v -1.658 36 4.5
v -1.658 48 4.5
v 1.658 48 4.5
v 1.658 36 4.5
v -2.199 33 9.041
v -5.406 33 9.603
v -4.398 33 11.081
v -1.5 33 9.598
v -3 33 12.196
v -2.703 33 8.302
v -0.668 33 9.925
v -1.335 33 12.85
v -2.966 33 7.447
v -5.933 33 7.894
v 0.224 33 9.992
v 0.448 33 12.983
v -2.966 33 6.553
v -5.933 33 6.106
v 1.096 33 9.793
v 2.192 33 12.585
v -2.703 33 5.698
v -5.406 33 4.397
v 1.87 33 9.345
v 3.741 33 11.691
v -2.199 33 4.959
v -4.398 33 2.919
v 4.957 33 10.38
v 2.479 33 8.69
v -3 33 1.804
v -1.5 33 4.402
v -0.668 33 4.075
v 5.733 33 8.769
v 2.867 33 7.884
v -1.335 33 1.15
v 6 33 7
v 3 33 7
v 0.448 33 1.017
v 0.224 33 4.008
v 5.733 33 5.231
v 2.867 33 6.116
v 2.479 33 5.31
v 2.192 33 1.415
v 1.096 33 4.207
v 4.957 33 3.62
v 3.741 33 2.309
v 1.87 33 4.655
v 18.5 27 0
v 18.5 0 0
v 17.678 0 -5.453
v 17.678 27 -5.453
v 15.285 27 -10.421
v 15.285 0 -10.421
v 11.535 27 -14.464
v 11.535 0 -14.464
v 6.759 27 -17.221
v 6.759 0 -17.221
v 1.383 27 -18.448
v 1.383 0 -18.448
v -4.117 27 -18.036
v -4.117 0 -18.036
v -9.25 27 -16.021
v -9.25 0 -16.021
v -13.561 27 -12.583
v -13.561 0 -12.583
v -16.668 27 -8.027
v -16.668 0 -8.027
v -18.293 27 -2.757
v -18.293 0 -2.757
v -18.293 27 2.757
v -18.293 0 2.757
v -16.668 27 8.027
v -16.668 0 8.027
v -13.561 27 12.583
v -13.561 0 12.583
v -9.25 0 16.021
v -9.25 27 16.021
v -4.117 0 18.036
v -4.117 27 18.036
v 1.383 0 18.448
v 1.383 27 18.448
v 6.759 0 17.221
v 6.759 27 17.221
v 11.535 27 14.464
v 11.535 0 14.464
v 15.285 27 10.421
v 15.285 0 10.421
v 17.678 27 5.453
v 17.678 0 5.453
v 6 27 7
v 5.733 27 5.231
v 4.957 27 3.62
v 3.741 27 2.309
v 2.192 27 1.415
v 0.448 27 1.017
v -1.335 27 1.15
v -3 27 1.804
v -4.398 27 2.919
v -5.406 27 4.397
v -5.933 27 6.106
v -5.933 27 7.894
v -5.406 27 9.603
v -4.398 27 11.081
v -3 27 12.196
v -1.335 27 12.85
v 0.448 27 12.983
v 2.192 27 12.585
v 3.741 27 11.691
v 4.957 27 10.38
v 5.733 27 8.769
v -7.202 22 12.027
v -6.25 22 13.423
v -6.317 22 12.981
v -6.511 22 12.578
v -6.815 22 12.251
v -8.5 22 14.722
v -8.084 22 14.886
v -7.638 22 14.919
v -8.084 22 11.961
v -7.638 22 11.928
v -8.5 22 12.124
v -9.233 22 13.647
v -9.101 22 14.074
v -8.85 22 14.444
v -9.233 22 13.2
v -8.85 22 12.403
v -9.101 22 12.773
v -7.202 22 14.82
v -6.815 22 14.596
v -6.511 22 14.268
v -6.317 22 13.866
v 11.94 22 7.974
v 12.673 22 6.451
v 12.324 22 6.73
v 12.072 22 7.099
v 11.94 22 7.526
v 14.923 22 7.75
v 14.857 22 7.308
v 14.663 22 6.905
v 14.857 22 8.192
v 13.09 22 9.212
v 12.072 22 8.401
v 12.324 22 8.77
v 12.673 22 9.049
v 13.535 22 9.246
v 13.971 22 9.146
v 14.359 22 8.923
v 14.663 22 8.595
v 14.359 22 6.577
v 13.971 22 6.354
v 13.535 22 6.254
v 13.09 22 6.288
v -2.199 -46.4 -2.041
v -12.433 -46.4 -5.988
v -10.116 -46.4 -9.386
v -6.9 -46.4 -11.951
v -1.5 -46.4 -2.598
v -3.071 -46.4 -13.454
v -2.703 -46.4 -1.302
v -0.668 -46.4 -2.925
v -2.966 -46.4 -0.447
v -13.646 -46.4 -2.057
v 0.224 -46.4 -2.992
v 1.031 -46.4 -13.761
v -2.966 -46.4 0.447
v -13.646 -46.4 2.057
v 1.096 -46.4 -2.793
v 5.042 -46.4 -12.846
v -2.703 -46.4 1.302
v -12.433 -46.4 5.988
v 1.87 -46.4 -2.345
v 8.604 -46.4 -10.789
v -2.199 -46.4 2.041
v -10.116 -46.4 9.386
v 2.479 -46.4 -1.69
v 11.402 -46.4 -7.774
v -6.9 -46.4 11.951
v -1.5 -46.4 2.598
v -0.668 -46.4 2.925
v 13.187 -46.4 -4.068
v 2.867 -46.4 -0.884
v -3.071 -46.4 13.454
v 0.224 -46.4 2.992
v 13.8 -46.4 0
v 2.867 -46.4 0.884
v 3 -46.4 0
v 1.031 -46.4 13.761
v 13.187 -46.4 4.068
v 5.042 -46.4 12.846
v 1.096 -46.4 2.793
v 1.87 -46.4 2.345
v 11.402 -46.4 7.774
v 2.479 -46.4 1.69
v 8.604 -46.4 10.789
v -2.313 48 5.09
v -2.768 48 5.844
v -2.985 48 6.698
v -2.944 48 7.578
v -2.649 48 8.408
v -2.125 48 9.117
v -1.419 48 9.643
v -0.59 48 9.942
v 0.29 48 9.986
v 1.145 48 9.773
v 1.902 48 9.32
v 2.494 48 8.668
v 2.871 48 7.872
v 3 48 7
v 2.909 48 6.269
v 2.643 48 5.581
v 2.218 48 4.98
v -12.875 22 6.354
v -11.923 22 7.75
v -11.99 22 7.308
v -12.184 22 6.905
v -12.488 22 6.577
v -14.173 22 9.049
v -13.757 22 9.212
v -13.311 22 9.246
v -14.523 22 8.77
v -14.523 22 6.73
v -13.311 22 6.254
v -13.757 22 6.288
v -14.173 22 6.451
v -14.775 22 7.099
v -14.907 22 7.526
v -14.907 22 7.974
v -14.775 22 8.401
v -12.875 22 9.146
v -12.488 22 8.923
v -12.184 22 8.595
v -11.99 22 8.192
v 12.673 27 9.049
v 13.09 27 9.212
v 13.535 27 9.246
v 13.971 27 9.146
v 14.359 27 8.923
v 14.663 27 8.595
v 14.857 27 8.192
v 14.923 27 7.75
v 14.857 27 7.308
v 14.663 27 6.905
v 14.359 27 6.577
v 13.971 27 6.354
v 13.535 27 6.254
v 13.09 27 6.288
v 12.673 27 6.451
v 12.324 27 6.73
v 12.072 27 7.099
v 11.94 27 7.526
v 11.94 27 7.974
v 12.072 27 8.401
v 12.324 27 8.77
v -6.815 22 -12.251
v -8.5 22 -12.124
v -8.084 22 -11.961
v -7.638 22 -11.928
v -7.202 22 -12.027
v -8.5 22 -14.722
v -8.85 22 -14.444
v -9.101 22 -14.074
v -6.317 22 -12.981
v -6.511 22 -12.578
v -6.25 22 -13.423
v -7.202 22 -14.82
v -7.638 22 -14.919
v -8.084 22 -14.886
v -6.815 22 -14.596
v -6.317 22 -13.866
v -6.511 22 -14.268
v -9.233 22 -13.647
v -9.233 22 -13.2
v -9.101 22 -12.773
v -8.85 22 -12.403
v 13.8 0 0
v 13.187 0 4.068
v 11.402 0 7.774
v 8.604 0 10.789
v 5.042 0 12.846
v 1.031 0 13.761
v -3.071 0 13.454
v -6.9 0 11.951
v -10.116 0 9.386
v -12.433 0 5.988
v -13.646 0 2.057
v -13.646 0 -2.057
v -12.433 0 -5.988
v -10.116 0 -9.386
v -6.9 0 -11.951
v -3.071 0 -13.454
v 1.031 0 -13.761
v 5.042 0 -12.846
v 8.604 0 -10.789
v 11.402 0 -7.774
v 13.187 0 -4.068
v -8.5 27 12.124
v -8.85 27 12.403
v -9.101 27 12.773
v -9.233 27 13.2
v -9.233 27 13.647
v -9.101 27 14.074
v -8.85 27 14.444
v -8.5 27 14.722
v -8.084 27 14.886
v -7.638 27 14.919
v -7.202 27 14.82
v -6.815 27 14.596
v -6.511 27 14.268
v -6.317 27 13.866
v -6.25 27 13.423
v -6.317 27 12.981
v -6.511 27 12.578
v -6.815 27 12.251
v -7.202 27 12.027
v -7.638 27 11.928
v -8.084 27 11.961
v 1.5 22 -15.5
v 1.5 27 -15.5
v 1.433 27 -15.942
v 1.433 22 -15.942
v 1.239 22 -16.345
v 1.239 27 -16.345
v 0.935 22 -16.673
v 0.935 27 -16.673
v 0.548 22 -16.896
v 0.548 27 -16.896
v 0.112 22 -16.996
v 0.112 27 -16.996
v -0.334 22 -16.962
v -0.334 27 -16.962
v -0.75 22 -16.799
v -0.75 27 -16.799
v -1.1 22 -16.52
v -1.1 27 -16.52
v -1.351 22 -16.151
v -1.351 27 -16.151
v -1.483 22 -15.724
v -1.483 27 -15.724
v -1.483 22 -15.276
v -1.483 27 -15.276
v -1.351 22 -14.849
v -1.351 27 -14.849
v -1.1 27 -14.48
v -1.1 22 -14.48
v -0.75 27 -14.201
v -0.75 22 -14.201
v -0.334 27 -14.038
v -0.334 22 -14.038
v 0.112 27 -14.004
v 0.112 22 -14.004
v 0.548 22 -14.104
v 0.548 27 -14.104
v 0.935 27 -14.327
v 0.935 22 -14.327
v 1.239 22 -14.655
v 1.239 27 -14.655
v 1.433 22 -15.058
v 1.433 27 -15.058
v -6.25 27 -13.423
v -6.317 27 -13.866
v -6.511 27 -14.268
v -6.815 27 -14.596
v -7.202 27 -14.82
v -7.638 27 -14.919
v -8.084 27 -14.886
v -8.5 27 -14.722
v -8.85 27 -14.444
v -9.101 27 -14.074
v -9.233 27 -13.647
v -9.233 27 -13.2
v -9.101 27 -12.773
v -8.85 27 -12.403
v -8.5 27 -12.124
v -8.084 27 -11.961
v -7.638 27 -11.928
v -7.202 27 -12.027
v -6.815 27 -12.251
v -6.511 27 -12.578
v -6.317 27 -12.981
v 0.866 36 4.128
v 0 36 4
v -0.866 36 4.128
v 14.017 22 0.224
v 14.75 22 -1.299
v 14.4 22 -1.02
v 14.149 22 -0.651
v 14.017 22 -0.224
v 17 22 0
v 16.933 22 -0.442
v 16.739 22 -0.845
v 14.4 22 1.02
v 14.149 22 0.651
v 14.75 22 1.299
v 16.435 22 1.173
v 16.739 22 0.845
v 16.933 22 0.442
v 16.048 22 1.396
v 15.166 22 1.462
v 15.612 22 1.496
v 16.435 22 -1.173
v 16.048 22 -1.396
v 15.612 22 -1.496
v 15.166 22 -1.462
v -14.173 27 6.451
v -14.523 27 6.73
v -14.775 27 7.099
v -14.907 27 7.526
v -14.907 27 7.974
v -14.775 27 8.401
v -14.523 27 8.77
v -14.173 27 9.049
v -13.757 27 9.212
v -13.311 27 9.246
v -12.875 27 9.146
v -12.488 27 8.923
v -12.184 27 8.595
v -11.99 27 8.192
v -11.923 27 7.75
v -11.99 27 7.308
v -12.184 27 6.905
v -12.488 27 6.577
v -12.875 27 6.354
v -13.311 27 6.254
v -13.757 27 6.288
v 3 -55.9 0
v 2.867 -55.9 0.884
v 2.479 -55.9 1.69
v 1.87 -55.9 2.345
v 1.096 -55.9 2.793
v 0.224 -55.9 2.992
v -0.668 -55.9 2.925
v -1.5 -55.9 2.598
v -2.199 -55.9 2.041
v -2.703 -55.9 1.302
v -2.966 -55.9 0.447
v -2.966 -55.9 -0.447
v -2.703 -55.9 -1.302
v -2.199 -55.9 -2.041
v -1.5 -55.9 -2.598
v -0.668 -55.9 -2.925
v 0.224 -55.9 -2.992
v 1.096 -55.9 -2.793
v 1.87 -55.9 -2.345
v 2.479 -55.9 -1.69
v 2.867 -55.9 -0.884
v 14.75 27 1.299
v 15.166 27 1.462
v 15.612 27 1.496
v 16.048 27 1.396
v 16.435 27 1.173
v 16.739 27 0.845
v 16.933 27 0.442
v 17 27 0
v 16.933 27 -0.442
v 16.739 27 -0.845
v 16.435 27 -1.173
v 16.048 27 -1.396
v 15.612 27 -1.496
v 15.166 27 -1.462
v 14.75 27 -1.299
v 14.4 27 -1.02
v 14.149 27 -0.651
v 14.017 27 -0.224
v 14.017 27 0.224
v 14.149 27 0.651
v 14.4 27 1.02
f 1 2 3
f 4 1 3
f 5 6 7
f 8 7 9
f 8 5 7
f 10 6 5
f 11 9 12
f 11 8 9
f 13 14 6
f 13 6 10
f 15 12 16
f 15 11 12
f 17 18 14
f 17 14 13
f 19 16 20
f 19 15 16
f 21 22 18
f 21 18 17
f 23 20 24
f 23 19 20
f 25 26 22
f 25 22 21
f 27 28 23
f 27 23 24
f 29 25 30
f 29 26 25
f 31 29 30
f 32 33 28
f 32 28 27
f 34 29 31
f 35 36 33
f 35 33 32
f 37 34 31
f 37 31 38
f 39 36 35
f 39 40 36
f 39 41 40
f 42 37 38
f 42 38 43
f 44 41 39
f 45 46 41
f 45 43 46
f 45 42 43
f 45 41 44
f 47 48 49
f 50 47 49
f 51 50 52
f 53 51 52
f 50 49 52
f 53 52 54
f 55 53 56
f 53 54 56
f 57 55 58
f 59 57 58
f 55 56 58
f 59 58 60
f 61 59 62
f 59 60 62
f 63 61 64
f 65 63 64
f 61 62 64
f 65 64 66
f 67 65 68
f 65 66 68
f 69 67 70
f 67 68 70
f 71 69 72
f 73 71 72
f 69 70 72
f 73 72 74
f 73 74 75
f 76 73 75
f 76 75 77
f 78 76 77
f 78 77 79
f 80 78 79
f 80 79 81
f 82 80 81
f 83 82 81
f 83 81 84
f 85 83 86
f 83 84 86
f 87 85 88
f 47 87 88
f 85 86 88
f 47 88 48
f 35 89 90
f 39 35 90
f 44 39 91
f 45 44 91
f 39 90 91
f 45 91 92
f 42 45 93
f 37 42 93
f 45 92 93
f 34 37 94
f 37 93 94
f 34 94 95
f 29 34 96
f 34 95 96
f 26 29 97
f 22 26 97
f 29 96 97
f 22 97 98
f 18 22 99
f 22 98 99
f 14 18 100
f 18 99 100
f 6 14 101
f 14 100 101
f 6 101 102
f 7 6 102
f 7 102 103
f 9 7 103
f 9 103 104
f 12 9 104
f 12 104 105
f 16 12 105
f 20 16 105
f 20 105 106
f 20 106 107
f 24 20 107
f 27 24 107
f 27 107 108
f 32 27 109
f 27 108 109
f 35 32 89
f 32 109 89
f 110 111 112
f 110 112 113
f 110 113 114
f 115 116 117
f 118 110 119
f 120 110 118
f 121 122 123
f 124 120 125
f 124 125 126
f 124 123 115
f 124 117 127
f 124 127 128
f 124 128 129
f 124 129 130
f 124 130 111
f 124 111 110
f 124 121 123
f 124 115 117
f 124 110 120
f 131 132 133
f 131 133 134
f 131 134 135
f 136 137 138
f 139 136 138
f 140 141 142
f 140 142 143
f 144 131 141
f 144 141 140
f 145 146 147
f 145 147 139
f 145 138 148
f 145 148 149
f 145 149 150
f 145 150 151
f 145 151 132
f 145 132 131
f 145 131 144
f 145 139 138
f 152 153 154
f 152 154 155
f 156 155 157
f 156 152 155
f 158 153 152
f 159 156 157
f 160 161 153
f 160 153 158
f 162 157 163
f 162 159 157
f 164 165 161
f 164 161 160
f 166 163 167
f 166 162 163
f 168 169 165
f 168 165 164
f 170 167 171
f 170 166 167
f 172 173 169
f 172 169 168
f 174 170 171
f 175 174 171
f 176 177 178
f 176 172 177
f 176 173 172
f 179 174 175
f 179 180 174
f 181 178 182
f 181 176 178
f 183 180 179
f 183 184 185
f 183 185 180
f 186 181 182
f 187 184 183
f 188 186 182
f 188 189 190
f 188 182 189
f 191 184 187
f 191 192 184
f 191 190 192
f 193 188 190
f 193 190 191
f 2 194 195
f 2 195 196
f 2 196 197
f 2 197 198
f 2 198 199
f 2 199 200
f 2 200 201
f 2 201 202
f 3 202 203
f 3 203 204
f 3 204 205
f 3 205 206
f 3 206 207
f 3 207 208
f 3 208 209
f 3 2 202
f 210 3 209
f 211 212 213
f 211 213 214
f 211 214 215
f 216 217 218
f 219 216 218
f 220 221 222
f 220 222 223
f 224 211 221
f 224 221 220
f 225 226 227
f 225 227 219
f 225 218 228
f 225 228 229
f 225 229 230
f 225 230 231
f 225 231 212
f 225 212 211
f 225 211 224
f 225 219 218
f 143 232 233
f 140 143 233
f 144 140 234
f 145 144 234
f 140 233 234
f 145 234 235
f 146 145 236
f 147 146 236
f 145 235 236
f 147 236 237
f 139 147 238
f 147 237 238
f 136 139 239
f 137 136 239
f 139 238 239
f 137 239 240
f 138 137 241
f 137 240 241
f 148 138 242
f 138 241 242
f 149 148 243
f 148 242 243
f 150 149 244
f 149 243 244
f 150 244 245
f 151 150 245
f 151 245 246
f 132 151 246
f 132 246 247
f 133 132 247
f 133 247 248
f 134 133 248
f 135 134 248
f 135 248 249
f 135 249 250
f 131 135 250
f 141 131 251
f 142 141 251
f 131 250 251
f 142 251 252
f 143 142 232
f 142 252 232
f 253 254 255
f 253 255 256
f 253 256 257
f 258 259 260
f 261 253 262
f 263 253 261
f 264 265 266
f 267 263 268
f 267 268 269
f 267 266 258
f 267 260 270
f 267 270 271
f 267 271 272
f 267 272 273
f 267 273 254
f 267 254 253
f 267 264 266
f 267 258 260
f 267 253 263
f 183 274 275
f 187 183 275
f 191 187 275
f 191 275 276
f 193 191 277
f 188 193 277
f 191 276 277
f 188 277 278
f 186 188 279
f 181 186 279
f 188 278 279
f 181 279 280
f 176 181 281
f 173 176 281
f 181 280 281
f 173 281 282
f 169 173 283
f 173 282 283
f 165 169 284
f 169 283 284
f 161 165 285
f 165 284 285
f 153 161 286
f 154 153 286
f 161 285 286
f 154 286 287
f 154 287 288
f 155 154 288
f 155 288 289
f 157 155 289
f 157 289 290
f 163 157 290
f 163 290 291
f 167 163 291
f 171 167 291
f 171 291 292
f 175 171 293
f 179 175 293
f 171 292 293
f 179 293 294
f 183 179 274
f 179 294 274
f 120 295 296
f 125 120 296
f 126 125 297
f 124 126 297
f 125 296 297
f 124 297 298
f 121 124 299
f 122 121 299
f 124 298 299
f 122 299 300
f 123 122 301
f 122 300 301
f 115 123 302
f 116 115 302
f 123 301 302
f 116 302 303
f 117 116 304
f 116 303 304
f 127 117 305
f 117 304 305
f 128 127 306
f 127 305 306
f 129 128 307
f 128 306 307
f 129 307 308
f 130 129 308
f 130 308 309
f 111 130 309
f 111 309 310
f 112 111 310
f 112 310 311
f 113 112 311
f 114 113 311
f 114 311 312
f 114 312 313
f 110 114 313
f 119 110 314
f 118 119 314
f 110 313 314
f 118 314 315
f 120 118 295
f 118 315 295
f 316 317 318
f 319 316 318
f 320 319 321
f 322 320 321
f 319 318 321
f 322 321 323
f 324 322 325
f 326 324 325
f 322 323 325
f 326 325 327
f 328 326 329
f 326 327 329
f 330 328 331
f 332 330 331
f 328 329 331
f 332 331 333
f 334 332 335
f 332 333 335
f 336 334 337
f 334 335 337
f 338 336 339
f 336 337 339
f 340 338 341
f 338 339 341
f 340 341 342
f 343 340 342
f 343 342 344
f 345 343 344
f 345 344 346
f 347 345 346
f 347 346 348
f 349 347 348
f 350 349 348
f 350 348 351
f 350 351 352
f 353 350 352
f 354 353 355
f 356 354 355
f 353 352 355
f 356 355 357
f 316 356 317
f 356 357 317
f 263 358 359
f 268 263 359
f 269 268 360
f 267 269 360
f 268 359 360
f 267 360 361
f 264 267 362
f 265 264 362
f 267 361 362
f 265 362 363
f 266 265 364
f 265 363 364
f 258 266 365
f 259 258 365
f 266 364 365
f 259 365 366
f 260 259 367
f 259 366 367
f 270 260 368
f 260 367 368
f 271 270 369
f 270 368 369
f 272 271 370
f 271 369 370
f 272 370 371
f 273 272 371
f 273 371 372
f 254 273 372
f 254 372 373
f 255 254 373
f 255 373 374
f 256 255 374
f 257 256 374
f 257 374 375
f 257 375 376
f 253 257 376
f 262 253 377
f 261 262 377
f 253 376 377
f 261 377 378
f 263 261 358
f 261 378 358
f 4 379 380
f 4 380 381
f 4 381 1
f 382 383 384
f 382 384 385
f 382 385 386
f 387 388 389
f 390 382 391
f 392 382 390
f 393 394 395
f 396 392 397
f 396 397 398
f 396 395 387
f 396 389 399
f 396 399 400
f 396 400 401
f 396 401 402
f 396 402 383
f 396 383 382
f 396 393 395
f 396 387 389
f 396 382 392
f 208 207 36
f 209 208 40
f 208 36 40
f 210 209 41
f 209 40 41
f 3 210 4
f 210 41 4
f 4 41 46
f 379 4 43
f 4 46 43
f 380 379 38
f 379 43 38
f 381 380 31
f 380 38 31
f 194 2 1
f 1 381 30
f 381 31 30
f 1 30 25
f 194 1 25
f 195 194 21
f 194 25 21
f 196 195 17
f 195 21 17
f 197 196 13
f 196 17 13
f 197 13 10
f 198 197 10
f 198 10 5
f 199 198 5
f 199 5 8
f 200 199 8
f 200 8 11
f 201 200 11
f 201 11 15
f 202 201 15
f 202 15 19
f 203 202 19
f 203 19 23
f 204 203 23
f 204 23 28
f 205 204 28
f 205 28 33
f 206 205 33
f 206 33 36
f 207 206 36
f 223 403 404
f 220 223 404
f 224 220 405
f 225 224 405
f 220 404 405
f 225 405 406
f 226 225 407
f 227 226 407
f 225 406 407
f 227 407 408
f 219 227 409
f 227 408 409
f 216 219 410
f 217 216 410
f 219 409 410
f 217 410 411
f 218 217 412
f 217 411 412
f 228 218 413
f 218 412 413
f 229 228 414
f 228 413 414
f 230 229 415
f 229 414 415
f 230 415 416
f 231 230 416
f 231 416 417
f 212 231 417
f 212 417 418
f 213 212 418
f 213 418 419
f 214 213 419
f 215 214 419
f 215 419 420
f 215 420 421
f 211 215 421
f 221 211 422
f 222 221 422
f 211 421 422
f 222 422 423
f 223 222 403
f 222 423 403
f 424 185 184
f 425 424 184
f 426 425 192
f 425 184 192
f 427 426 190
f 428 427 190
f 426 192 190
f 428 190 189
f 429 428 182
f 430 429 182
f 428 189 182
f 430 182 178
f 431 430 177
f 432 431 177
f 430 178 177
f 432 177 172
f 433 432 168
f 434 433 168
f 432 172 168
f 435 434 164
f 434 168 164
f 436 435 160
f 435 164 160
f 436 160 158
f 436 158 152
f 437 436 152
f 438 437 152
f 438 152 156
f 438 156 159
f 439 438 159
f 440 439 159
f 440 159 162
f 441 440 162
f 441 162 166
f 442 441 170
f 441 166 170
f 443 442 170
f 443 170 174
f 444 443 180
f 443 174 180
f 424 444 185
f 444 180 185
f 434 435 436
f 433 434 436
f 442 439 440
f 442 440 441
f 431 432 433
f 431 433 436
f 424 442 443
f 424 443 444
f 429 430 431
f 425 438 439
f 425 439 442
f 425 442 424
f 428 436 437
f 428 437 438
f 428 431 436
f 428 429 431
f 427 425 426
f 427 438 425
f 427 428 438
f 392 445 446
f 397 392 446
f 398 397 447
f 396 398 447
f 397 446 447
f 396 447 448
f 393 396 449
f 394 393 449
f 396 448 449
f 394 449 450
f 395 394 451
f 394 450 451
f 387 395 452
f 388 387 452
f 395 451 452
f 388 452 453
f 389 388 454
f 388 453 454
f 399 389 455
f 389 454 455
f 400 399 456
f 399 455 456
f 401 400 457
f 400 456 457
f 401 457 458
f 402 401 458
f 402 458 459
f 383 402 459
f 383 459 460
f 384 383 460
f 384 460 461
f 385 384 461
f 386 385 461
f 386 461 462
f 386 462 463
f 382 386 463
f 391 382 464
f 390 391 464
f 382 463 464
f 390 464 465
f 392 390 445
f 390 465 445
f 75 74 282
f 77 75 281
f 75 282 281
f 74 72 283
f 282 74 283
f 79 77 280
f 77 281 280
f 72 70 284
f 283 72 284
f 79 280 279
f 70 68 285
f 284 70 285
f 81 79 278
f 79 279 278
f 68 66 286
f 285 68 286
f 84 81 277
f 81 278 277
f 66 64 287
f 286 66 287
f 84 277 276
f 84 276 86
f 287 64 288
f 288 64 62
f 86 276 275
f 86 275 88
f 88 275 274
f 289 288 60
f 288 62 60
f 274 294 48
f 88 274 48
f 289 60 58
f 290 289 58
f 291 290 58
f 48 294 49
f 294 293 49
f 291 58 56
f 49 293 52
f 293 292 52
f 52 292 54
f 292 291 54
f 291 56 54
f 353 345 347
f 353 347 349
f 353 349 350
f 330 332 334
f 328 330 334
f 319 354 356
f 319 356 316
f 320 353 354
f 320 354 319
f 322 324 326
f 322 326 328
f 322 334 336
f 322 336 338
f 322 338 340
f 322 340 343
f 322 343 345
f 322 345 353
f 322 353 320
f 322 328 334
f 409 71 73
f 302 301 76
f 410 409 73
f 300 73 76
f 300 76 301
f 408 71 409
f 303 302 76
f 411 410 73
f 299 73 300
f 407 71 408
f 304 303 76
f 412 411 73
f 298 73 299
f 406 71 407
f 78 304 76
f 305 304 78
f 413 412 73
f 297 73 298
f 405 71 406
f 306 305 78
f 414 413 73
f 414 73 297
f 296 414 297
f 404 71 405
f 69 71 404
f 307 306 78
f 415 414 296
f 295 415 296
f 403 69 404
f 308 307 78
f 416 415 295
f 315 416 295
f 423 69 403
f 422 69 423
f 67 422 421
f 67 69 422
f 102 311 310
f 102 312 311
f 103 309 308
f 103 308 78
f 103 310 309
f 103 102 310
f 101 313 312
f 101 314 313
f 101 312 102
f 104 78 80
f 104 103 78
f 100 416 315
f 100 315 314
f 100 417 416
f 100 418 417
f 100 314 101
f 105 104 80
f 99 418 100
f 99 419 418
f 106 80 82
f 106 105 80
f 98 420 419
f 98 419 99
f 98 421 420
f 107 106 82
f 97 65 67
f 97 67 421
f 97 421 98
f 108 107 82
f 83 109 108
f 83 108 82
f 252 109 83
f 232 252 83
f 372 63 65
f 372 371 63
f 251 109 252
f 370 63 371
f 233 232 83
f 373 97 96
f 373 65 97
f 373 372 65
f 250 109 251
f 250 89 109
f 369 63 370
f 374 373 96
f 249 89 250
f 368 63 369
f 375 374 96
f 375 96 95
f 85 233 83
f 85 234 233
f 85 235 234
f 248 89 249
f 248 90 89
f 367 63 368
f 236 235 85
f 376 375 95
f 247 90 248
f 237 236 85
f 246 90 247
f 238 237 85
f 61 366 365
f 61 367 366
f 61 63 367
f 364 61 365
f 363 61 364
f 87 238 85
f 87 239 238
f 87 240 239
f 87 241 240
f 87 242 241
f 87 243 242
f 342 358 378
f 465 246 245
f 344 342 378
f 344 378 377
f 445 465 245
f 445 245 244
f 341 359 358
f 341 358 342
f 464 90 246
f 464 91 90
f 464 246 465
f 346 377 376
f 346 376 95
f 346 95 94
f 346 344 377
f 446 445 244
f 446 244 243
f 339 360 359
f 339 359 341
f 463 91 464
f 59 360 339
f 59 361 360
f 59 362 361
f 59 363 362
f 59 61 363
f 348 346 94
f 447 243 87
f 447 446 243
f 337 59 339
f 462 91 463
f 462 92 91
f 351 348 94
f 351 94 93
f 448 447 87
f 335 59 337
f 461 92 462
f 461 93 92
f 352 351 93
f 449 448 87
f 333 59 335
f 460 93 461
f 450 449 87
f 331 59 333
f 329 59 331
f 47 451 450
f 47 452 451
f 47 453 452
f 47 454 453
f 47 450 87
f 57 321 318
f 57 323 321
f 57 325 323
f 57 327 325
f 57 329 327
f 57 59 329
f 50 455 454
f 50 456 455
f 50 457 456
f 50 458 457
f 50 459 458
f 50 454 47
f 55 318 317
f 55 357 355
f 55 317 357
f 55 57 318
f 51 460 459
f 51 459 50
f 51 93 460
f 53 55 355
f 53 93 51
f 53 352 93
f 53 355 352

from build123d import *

# Parameters (mm, degrees)
SKETCH1_R           = 18.5
BOSS_EXTRUDE1_DEPTH = 27
SKETCH2_R           = 1.5
CUT_EXTRUDE1_DEPTH  = 5
CIRPATTERN1_COUNT   = 3
SKETCH3_R           = 6
BOSS_EXTRUDE2_DEPTH = 6
SKETCH4_R           = 3
BOSS_EXTRUDE3_DEPTH = 15
CUT_EXTRUDE2_DEPTH  = 12
SKETCH6_R           = 13.8
BOSS_EXTRUDE4_DEPTH = 46.4
SKETCH7_R           = 3
BOSS_EXTRUDE5_DEPTH = 9.5


with BuildPart() as part:
    # Sketch1 → Boss-Extrude1 (new body)
    with BuildSketch(Plane(origin=(0, 0, 0), x_dir=(1, 0, 0), z_dir=(0, 1, 0))):
        Circle(SKETCH1_R)
    extrude(amount=BOSS_EXTRUDE1_DEPTH)

    # Sketch2 → Cut-Extrude1 (cut)
    with BuildSketch(Plane(origin=(0, 27, 0), x_dir=(1, 0, 0), z_dir=(0, 1, 0))):
        with Locations((0, 15.5)):
            Circle(SKETCH2_R)
        with Locations((-7.75, 13.423393759)):
            Circle(SKETCH2_R)
    cut_extrude1 = extrude(amount=-CUT_EXTRUDE1_DEPTH, mode=Mode.SUBTRACT)

    # CirPattern1: Cut-Extrude1 ×3 about axis
    cirpattern1_axis = Axis((0, 0, 0), (0, 1, 0))
    for i in range(1, CIRPATTERN1_COUNT):
        add(cut_extrude1.rotate(cirpattern1_axis, i * 360 / CIRPATTERN1_COUNT), mode=Mode.SUBTRACT)

    # Sketch3 → Boss-Extrude2 (add)
    with BuildSketch(Plane(origin=(0, 27, 0), x_dir=(1, 0, 0), z_dir=(0, 1, 0))):
        with Locations((0, -7)):
            Circle(SKETCH3_R)
    extrude(amount=BOSS_EXTRUDE2_DEPTH)

    # Sketch4 → Boss-Extrude3 (add)
    with BuildSketch(Plane(origin=(0, 33, 0), x_dir=(1, 0, 0), z_dir=(0, 1, 0))):
        with Locations((0, -7)):
            Circle(SKETCH4_R)
    extrude(amount=BOSS_EXTRUDE3_DEPTH)

    # Sketch5 → Cut-Extrude2 (cut)
    with BuildSketch(Plane(origin=(0, 48, 0), x_dir=(1, 0, 0), z_dir=(0, 1, 0))):
        with BuildLine():
            Line((-1.658312395, -4.5), (1.658312395, -4.5))
            ThreePointArc((1.658312395, -4.5), (0, -4), (-1.658312395, -4.5))
        make_face()
    extrude(amount=-CUT_EXTRUDE2_DEPTH, mode=Mode.SUBTRACT)

    # Sketch6 → Boss-Extrude4 (add)
    with BuildSketch(Plane.XZ):
        Circle(SKETCH6_R)
    extrude(amount=BOSS_EXTRUDE4_DEPTH)

    # Sketch7 → Boss-Extrude5 (add)
    with BuildSketch(Plane.XZ.offset(46.4)):
        Circle(SKETCH7_R)
    extrude(amount=BOSS_EXTRUDE5_DEPTH)


solid = part.part
